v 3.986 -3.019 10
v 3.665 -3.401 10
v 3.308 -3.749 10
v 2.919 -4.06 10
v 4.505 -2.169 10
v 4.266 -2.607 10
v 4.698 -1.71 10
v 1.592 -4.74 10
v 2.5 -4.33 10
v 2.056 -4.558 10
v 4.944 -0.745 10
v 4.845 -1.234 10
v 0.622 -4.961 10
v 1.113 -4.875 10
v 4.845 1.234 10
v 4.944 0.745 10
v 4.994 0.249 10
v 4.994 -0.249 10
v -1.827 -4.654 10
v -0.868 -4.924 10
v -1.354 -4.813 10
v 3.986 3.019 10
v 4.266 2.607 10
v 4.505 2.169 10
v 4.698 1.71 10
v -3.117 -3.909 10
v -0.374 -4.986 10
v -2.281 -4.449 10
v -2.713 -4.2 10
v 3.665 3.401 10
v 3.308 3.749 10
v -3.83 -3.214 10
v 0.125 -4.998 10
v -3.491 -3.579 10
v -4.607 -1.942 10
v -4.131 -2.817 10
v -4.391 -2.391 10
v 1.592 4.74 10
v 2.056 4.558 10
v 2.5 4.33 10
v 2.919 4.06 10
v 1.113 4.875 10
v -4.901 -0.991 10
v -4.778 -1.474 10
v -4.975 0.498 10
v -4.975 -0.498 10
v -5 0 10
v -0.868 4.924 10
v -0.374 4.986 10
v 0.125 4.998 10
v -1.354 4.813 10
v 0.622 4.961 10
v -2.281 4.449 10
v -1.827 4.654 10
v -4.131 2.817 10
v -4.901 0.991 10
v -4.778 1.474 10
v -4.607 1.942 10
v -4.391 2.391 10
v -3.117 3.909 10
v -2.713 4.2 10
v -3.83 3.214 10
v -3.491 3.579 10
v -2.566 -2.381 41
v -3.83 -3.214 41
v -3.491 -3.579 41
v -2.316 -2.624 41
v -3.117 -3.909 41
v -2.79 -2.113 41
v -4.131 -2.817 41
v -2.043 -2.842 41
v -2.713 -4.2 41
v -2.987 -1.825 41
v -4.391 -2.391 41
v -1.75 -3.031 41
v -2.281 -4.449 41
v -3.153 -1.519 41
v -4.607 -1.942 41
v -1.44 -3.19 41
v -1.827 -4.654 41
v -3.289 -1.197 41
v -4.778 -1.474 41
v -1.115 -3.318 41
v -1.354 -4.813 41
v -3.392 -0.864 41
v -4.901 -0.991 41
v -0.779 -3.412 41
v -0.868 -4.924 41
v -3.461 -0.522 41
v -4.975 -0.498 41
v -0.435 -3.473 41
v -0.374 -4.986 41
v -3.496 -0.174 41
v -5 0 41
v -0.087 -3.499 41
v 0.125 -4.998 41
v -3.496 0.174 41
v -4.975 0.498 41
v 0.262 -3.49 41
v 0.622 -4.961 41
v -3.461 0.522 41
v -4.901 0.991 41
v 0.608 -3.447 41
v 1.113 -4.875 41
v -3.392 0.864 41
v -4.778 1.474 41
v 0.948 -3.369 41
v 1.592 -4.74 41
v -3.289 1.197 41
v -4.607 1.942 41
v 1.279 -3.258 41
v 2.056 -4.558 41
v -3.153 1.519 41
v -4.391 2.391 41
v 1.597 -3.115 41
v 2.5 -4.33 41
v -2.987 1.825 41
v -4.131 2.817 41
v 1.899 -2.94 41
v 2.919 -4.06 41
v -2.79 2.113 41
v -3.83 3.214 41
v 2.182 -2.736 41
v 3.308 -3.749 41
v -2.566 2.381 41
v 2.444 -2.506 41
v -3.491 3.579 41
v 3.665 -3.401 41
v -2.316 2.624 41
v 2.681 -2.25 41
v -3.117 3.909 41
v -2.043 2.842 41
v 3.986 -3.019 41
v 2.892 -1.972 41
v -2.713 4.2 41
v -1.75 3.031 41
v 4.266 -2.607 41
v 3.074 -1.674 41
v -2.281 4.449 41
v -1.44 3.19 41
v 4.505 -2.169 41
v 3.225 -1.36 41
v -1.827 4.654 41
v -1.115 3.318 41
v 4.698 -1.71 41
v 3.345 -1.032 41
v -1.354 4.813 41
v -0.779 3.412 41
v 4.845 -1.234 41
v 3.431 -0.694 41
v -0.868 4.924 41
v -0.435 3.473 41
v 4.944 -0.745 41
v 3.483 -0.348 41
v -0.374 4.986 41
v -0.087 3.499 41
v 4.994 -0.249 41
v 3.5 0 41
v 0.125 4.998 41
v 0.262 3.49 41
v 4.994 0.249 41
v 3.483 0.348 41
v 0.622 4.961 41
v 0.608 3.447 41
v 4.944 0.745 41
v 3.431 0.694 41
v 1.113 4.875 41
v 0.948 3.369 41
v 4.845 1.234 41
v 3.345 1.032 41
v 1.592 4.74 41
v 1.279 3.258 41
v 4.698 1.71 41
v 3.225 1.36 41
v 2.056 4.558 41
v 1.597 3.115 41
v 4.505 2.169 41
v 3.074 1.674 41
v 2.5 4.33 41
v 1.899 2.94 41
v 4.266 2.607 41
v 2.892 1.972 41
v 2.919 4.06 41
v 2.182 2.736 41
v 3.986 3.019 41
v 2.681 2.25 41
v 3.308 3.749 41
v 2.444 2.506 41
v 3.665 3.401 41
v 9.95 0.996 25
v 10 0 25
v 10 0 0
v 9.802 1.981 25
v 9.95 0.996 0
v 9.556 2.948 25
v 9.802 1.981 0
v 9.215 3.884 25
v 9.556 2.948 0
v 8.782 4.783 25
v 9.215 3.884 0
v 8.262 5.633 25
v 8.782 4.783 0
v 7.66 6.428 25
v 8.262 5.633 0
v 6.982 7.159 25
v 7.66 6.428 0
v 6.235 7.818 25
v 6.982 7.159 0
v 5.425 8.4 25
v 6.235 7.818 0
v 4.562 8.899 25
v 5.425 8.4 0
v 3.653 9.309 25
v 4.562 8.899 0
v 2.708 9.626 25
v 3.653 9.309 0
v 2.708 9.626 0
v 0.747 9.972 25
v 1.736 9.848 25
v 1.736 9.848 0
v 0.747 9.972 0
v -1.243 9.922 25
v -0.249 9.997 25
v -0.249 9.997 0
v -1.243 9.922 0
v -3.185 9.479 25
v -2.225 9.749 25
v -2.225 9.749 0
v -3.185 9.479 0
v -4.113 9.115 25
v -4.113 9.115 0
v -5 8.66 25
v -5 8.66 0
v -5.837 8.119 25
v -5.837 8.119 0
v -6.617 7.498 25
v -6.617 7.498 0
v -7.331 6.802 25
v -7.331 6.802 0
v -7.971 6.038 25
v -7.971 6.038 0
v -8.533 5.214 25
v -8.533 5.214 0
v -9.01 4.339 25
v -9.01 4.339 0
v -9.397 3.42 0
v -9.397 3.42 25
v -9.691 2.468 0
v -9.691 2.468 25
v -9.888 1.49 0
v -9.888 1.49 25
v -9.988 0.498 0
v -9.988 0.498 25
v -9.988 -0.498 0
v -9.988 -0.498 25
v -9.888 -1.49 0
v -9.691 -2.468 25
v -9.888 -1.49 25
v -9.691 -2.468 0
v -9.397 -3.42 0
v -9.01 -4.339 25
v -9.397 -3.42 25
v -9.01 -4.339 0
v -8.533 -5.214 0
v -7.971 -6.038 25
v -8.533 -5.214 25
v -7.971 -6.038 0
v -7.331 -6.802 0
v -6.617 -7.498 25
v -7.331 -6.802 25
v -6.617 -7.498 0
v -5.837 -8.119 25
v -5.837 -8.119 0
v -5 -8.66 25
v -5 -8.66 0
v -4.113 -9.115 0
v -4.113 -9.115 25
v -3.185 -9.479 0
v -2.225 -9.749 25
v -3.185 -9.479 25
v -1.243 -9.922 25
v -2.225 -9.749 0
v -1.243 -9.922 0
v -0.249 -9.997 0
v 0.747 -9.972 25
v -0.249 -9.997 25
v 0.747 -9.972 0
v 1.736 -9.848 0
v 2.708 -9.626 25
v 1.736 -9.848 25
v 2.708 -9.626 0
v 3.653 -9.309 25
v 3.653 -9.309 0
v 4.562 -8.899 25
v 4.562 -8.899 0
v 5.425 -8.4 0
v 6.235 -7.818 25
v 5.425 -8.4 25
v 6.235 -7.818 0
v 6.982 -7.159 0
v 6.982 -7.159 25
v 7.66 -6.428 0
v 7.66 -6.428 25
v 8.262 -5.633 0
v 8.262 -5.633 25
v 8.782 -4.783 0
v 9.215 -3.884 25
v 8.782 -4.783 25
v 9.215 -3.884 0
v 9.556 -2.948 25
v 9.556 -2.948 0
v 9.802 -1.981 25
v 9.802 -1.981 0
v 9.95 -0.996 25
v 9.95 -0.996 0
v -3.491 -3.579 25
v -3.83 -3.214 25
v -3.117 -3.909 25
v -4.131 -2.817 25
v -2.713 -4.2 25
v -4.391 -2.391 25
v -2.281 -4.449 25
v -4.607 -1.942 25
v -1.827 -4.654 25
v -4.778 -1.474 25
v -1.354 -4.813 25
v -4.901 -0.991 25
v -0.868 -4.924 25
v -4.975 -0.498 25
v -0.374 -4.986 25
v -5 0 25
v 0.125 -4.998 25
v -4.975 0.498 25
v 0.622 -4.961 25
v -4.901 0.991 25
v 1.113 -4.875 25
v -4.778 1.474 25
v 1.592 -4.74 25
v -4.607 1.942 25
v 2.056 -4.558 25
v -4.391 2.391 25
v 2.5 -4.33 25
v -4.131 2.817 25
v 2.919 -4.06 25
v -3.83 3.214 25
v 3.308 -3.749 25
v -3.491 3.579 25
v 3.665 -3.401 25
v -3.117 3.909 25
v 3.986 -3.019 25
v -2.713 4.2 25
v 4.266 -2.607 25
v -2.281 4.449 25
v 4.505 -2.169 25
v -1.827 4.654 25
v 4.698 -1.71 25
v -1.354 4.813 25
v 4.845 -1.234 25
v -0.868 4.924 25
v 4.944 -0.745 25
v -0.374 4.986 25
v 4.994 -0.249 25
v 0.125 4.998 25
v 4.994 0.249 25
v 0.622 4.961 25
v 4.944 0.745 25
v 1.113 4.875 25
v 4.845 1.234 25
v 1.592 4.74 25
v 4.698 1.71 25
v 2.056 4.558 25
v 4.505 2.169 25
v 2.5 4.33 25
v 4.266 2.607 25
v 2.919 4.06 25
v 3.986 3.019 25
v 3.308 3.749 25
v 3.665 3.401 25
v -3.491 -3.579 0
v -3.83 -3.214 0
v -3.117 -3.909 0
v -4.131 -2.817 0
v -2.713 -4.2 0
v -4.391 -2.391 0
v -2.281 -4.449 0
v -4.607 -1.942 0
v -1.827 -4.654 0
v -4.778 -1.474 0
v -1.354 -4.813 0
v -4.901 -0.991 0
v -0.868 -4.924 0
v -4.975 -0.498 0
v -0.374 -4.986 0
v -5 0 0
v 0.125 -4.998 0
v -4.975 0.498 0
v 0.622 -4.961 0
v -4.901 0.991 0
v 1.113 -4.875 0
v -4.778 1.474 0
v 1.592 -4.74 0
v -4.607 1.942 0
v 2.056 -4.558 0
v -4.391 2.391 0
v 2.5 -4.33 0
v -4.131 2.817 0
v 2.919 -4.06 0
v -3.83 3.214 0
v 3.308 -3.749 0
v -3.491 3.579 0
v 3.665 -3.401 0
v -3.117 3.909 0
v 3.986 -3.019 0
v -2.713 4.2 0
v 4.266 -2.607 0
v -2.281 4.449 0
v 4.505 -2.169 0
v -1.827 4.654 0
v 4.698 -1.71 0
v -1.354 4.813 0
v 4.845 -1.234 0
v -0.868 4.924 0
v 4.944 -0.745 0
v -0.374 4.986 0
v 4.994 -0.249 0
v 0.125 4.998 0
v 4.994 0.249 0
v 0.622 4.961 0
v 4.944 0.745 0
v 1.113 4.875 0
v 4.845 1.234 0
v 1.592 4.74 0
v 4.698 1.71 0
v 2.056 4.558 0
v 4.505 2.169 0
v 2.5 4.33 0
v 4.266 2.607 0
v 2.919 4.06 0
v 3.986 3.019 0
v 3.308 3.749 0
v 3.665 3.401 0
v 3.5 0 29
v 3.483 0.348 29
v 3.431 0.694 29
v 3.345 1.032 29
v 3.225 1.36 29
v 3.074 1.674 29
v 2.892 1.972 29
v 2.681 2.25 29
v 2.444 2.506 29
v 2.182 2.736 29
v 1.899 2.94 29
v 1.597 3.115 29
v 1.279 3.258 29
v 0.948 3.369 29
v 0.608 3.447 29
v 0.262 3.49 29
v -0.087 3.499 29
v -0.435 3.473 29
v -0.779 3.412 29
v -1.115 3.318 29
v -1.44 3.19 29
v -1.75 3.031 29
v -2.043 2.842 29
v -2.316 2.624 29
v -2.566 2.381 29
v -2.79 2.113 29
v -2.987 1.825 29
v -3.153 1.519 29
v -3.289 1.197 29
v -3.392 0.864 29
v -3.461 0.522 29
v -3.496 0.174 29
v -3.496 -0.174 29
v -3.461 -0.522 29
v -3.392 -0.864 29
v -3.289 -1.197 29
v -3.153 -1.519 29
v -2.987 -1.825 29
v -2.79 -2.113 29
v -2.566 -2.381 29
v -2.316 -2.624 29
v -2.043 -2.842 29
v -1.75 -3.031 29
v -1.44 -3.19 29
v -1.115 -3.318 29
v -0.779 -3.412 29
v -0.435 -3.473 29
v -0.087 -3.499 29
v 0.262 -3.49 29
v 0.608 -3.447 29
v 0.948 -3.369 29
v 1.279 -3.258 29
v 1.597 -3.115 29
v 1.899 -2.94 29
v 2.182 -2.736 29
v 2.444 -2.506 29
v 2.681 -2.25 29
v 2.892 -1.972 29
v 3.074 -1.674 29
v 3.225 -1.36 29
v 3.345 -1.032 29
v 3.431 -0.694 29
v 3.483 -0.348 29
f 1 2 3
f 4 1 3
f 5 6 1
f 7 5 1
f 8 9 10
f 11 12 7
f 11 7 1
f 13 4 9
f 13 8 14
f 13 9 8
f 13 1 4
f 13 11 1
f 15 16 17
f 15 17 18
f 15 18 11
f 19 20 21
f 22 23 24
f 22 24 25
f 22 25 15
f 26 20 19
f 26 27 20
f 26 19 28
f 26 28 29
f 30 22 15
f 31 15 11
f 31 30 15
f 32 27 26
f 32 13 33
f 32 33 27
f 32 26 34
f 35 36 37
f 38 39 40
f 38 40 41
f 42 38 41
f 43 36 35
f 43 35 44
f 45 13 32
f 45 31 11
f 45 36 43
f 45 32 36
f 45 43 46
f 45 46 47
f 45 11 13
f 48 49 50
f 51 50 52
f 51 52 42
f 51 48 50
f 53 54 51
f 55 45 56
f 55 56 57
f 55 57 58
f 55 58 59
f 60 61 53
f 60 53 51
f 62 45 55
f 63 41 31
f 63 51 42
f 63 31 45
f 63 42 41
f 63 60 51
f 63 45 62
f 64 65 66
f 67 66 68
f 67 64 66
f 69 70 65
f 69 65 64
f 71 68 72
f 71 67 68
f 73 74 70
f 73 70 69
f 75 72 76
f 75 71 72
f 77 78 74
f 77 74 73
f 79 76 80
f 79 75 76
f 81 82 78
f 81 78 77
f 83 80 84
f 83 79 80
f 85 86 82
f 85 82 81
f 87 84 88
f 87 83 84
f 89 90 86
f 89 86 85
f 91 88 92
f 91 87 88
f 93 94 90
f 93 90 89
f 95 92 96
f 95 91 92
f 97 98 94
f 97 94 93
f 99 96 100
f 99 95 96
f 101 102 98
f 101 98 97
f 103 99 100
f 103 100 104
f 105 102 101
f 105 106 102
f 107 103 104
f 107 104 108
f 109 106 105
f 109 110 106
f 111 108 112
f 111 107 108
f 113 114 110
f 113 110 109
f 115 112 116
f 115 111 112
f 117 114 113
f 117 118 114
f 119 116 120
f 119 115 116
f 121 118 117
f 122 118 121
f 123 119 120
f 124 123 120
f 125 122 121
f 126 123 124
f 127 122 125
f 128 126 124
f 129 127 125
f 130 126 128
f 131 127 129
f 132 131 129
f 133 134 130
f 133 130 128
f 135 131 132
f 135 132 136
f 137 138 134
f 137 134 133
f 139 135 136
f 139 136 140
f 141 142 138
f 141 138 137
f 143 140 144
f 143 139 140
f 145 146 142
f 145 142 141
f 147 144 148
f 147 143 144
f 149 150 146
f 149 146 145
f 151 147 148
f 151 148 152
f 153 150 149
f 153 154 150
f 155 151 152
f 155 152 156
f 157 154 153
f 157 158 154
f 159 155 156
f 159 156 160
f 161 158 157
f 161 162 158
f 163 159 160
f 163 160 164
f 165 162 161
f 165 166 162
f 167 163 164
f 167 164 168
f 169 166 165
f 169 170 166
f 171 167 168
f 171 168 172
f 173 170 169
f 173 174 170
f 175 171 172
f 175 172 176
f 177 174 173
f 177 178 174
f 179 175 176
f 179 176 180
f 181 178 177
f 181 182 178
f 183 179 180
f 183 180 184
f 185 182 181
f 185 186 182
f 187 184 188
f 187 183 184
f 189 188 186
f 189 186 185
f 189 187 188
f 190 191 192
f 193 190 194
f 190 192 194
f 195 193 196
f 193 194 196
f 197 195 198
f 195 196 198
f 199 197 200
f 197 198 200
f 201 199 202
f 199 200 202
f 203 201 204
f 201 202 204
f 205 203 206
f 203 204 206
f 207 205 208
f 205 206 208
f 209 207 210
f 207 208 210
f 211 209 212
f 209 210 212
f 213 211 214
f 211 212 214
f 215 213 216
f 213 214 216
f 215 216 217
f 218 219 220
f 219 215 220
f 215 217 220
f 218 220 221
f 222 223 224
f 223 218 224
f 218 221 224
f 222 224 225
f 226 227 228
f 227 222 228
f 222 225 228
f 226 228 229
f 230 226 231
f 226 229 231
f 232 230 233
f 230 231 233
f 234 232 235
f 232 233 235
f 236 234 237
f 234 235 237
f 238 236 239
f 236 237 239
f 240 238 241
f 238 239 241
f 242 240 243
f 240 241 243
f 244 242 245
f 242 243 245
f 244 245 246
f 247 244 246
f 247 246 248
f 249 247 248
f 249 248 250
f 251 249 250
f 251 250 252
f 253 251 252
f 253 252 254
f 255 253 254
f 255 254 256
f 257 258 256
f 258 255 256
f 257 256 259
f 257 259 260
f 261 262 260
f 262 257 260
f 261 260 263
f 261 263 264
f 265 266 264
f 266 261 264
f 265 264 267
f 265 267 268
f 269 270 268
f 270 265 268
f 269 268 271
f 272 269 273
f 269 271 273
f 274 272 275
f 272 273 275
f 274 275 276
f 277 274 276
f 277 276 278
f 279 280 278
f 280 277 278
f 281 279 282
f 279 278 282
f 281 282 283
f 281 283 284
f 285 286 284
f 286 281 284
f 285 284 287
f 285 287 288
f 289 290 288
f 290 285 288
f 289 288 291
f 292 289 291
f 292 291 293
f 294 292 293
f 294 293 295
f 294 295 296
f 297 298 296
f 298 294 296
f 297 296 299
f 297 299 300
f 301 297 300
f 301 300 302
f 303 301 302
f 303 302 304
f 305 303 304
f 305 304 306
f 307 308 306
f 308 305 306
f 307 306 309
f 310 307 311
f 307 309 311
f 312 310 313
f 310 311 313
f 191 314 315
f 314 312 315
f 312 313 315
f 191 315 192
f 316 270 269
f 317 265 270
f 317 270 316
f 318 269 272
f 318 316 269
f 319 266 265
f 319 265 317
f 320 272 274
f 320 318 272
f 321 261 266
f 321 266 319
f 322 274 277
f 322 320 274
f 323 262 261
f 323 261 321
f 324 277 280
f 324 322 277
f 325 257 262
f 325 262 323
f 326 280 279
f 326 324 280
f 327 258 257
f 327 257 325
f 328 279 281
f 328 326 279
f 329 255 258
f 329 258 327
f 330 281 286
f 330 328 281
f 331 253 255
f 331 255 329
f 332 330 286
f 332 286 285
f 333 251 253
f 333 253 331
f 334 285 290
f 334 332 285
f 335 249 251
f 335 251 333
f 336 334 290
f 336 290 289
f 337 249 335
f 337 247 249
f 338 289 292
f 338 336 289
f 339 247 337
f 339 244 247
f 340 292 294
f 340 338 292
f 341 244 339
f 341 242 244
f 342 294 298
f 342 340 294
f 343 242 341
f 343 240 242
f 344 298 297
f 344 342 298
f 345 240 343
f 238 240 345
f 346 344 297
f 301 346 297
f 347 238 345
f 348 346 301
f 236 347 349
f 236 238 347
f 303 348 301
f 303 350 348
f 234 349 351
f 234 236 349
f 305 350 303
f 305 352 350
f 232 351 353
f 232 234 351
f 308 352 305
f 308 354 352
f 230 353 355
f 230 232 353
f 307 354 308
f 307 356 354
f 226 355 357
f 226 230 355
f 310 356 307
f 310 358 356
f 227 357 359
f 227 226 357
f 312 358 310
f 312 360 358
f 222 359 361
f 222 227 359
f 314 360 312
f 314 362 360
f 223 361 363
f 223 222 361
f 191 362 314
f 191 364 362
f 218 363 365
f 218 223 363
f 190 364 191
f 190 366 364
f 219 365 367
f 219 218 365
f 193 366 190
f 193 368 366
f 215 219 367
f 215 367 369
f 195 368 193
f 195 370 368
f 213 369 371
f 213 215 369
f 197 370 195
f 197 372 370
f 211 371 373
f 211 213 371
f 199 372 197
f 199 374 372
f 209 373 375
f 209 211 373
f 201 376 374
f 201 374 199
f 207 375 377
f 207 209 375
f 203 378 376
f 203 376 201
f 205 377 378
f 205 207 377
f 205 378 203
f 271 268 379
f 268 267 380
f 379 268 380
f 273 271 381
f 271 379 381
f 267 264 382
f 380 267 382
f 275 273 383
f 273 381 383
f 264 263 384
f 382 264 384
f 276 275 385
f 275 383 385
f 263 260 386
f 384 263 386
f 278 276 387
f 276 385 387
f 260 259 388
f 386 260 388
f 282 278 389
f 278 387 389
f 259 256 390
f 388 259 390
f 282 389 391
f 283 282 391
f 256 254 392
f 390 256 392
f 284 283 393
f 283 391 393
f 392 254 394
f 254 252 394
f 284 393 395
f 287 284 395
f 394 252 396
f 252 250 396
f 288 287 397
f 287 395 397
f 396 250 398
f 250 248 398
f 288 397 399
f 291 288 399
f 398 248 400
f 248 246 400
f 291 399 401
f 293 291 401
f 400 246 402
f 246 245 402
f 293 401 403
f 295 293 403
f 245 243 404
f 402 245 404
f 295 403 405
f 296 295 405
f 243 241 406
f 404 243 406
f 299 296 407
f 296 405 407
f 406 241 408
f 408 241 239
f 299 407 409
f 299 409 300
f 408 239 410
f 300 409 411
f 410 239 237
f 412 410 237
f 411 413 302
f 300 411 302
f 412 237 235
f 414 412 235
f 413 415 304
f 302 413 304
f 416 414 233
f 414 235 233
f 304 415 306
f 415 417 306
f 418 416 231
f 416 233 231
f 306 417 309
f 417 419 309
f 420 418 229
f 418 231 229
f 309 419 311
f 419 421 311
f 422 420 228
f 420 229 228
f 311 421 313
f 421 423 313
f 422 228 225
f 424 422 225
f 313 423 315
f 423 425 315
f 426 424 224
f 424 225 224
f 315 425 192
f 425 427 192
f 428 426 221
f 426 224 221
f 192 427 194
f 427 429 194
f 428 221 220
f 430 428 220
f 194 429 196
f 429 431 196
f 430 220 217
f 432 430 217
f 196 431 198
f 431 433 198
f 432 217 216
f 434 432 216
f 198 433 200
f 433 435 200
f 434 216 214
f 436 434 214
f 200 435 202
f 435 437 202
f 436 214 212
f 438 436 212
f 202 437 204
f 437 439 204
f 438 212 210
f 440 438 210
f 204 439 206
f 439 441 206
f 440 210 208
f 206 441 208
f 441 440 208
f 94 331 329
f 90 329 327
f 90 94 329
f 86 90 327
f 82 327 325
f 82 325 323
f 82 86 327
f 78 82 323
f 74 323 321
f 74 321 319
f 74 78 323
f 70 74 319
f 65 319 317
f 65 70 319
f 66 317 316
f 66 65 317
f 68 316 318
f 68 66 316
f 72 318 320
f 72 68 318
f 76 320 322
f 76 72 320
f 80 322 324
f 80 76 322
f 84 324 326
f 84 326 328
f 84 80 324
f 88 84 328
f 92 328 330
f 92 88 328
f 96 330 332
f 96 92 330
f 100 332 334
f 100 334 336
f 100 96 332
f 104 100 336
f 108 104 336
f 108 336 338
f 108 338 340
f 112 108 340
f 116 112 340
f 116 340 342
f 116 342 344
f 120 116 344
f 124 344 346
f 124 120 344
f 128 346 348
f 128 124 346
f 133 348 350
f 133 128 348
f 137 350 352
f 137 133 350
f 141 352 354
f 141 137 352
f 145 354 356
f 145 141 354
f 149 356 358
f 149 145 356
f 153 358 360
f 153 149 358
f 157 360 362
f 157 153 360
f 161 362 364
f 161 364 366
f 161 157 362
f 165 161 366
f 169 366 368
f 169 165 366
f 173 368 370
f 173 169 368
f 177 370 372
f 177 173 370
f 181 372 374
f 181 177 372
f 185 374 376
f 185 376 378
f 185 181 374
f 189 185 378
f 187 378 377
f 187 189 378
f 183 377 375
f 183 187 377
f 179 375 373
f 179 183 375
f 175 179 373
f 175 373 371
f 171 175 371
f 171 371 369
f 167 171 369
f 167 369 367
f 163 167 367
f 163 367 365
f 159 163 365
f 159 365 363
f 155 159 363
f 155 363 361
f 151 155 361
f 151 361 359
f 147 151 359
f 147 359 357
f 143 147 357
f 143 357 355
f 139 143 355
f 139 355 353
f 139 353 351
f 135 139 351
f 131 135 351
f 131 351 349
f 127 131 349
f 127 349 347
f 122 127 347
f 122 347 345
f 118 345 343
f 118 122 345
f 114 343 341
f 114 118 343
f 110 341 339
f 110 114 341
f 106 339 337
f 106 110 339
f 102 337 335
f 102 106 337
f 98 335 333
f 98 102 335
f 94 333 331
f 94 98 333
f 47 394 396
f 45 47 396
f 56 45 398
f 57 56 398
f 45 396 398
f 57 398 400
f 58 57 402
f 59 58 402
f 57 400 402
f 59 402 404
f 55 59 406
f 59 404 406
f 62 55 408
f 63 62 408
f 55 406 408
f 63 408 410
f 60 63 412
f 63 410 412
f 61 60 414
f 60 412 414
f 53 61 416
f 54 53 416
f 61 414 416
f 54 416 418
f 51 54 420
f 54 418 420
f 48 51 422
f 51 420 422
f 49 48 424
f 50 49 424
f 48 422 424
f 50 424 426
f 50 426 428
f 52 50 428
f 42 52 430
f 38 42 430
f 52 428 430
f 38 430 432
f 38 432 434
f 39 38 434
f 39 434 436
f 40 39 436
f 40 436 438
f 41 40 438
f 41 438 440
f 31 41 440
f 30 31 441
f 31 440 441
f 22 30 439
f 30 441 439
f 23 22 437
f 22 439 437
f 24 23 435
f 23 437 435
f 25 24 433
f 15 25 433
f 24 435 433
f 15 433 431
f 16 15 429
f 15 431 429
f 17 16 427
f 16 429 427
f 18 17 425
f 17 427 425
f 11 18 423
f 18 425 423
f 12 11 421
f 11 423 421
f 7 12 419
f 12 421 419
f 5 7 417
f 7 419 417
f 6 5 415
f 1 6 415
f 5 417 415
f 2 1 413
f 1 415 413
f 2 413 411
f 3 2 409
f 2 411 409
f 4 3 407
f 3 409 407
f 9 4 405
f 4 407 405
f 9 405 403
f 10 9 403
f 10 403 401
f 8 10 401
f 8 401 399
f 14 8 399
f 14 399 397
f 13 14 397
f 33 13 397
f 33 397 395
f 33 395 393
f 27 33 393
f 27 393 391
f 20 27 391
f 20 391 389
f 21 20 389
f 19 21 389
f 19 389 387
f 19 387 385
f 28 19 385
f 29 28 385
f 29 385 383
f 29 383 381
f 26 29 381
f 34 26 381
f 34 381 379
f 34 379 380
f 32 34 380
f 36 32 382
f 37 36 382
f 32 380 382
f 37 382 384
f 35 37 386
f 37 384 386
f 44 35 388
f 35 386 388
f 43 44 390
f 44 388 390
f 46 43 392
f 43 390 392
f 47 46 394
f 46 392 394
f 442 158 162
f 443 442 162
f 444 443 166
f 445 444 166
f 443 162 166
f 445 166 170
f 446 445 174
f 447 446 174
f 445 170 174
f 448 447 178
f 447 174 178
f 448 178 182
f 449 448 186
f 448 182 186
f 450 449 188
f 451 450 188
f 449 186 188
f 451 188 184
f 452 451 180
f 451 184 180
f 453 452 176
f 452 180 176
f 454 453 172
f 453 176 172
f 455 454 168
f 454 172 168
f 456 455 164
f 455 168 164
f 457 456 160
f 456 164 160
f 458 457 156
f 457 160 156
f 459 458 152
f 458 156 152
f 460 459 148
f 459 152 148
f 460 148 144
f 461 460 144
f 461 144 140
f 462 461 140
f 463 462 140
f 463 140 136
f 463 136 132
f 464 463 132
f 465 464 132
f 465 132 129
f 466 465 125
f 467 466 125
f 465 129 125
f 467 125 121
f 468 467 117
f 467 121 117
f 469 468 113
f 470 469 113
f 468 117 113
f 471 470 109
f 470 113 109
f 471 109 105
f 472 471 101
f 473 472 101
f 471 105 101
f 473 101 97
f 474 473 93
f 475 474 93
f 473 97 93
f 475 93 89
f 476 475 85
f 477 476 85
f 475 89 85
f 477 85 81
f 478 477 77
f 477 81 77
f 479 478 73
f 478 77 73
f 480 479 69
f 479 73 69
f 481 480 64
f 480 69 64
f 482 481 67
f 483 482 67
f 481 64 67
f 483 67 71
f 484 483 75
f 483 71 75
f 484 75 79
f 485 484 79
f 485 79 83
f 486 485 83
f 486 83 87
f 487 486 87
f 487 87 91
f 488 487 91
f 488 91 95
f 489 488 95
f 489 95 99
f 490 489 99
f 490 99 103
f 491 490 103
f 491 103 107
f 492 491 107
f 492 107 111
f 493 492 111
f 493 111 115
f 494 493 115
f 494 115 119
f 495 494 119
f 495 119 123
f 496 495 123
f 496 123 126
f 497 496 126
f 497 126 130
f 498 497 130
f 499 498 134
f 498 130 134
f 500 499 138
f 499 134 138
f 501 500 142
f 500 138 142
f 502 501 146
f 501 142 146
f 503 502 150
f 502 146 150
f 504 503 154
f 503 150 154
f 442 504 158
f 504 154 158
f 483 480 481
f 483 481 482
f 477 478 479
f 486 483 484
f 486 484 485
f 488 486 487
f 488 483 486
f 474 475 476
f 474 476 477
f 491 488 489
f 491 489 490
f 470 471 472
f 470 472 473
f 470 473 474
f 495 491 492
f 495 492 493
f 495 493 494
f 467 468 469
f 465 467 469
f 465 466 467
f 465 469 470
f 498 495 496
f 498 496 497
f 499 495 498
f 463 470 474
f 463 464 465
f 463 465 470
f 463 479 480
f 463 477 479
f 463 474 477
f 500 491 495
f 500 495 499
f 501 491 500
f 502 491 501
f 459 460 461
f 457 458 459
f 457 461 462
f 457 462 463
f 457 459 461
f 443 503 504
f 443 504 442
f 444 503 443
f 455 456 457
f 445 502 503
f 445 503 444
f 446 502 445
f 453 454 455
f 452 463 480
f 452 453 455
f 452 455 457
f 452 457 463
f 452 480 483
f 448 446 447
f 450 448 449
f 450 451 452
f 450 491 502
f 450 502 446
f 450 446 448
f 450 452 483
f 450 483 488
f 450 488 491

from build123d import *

# Parameters (mm, degrees)
SKETCH1_R           = 10
BOSS_EXTRUDE1_DEPTH = 41
SKETCH2_R           = 5
CUT_EXTRUDE1_DEPTH  = 10
SKETCH3_OUTSIDE_W   = 31.962
SKETCH3_OUTSIDE_H   = 31.962
SKETCH3_OUTSIDE_R   = 5
CUT_EXTRUDE2_DEPTH  = 16
SKETCH4_R           = 3.5
CUT_EXTRUDE3_DEPTH  = 12


with BuildPart() as part:
    # Sketch1 → Boss-Extrude1 (new body)
    with BuildSketch(Plane.XY):
        Circle(SKETCH1_R)
    extrude(amount=BOSS_EXTRUDE1_DEPTH)

    # Sketch2 → Cut-Extrude1 (cut)
    with BuildSketch(Plane(origin=(0, 0, 0), x_dir=(-1, 0, 0), z_dir=(0, 0, -1))):
        Circle(SKETCH2_R)
    extrude(amount=-CUT_EXTRUDE1_DEPTH, mode=Mode.SUBTRACT)

    # Sketch3 outside → Cut-Extrude2 (cut)
    with BuildSketch(Plane.XY.offset(41)):
        Rectangle(SKETCH3_OUTSIDE_W, SKETCH3_OUTSIDE_H)
        with Locations(Location((0, 0, 0), (0, 0, 180))):
            Circle(SKETCH3_OUTSIDE_R, mode=Mode.SUBTRACT)
    extrude(amount=-CUT_EXTRUDE2_DEPTH, mode=Mode.SUBTRACT)

    # Sketch4 → Cut-Extrude3 (cut)
    with BuildSketch(Plane.XY.offset(41)):
        Circle(SKETCH4_R)
    extrude(amount=-CUT_EXTRUDE3_DEPTH, mode=Mode.SUBTRACT)


solid = part.part
